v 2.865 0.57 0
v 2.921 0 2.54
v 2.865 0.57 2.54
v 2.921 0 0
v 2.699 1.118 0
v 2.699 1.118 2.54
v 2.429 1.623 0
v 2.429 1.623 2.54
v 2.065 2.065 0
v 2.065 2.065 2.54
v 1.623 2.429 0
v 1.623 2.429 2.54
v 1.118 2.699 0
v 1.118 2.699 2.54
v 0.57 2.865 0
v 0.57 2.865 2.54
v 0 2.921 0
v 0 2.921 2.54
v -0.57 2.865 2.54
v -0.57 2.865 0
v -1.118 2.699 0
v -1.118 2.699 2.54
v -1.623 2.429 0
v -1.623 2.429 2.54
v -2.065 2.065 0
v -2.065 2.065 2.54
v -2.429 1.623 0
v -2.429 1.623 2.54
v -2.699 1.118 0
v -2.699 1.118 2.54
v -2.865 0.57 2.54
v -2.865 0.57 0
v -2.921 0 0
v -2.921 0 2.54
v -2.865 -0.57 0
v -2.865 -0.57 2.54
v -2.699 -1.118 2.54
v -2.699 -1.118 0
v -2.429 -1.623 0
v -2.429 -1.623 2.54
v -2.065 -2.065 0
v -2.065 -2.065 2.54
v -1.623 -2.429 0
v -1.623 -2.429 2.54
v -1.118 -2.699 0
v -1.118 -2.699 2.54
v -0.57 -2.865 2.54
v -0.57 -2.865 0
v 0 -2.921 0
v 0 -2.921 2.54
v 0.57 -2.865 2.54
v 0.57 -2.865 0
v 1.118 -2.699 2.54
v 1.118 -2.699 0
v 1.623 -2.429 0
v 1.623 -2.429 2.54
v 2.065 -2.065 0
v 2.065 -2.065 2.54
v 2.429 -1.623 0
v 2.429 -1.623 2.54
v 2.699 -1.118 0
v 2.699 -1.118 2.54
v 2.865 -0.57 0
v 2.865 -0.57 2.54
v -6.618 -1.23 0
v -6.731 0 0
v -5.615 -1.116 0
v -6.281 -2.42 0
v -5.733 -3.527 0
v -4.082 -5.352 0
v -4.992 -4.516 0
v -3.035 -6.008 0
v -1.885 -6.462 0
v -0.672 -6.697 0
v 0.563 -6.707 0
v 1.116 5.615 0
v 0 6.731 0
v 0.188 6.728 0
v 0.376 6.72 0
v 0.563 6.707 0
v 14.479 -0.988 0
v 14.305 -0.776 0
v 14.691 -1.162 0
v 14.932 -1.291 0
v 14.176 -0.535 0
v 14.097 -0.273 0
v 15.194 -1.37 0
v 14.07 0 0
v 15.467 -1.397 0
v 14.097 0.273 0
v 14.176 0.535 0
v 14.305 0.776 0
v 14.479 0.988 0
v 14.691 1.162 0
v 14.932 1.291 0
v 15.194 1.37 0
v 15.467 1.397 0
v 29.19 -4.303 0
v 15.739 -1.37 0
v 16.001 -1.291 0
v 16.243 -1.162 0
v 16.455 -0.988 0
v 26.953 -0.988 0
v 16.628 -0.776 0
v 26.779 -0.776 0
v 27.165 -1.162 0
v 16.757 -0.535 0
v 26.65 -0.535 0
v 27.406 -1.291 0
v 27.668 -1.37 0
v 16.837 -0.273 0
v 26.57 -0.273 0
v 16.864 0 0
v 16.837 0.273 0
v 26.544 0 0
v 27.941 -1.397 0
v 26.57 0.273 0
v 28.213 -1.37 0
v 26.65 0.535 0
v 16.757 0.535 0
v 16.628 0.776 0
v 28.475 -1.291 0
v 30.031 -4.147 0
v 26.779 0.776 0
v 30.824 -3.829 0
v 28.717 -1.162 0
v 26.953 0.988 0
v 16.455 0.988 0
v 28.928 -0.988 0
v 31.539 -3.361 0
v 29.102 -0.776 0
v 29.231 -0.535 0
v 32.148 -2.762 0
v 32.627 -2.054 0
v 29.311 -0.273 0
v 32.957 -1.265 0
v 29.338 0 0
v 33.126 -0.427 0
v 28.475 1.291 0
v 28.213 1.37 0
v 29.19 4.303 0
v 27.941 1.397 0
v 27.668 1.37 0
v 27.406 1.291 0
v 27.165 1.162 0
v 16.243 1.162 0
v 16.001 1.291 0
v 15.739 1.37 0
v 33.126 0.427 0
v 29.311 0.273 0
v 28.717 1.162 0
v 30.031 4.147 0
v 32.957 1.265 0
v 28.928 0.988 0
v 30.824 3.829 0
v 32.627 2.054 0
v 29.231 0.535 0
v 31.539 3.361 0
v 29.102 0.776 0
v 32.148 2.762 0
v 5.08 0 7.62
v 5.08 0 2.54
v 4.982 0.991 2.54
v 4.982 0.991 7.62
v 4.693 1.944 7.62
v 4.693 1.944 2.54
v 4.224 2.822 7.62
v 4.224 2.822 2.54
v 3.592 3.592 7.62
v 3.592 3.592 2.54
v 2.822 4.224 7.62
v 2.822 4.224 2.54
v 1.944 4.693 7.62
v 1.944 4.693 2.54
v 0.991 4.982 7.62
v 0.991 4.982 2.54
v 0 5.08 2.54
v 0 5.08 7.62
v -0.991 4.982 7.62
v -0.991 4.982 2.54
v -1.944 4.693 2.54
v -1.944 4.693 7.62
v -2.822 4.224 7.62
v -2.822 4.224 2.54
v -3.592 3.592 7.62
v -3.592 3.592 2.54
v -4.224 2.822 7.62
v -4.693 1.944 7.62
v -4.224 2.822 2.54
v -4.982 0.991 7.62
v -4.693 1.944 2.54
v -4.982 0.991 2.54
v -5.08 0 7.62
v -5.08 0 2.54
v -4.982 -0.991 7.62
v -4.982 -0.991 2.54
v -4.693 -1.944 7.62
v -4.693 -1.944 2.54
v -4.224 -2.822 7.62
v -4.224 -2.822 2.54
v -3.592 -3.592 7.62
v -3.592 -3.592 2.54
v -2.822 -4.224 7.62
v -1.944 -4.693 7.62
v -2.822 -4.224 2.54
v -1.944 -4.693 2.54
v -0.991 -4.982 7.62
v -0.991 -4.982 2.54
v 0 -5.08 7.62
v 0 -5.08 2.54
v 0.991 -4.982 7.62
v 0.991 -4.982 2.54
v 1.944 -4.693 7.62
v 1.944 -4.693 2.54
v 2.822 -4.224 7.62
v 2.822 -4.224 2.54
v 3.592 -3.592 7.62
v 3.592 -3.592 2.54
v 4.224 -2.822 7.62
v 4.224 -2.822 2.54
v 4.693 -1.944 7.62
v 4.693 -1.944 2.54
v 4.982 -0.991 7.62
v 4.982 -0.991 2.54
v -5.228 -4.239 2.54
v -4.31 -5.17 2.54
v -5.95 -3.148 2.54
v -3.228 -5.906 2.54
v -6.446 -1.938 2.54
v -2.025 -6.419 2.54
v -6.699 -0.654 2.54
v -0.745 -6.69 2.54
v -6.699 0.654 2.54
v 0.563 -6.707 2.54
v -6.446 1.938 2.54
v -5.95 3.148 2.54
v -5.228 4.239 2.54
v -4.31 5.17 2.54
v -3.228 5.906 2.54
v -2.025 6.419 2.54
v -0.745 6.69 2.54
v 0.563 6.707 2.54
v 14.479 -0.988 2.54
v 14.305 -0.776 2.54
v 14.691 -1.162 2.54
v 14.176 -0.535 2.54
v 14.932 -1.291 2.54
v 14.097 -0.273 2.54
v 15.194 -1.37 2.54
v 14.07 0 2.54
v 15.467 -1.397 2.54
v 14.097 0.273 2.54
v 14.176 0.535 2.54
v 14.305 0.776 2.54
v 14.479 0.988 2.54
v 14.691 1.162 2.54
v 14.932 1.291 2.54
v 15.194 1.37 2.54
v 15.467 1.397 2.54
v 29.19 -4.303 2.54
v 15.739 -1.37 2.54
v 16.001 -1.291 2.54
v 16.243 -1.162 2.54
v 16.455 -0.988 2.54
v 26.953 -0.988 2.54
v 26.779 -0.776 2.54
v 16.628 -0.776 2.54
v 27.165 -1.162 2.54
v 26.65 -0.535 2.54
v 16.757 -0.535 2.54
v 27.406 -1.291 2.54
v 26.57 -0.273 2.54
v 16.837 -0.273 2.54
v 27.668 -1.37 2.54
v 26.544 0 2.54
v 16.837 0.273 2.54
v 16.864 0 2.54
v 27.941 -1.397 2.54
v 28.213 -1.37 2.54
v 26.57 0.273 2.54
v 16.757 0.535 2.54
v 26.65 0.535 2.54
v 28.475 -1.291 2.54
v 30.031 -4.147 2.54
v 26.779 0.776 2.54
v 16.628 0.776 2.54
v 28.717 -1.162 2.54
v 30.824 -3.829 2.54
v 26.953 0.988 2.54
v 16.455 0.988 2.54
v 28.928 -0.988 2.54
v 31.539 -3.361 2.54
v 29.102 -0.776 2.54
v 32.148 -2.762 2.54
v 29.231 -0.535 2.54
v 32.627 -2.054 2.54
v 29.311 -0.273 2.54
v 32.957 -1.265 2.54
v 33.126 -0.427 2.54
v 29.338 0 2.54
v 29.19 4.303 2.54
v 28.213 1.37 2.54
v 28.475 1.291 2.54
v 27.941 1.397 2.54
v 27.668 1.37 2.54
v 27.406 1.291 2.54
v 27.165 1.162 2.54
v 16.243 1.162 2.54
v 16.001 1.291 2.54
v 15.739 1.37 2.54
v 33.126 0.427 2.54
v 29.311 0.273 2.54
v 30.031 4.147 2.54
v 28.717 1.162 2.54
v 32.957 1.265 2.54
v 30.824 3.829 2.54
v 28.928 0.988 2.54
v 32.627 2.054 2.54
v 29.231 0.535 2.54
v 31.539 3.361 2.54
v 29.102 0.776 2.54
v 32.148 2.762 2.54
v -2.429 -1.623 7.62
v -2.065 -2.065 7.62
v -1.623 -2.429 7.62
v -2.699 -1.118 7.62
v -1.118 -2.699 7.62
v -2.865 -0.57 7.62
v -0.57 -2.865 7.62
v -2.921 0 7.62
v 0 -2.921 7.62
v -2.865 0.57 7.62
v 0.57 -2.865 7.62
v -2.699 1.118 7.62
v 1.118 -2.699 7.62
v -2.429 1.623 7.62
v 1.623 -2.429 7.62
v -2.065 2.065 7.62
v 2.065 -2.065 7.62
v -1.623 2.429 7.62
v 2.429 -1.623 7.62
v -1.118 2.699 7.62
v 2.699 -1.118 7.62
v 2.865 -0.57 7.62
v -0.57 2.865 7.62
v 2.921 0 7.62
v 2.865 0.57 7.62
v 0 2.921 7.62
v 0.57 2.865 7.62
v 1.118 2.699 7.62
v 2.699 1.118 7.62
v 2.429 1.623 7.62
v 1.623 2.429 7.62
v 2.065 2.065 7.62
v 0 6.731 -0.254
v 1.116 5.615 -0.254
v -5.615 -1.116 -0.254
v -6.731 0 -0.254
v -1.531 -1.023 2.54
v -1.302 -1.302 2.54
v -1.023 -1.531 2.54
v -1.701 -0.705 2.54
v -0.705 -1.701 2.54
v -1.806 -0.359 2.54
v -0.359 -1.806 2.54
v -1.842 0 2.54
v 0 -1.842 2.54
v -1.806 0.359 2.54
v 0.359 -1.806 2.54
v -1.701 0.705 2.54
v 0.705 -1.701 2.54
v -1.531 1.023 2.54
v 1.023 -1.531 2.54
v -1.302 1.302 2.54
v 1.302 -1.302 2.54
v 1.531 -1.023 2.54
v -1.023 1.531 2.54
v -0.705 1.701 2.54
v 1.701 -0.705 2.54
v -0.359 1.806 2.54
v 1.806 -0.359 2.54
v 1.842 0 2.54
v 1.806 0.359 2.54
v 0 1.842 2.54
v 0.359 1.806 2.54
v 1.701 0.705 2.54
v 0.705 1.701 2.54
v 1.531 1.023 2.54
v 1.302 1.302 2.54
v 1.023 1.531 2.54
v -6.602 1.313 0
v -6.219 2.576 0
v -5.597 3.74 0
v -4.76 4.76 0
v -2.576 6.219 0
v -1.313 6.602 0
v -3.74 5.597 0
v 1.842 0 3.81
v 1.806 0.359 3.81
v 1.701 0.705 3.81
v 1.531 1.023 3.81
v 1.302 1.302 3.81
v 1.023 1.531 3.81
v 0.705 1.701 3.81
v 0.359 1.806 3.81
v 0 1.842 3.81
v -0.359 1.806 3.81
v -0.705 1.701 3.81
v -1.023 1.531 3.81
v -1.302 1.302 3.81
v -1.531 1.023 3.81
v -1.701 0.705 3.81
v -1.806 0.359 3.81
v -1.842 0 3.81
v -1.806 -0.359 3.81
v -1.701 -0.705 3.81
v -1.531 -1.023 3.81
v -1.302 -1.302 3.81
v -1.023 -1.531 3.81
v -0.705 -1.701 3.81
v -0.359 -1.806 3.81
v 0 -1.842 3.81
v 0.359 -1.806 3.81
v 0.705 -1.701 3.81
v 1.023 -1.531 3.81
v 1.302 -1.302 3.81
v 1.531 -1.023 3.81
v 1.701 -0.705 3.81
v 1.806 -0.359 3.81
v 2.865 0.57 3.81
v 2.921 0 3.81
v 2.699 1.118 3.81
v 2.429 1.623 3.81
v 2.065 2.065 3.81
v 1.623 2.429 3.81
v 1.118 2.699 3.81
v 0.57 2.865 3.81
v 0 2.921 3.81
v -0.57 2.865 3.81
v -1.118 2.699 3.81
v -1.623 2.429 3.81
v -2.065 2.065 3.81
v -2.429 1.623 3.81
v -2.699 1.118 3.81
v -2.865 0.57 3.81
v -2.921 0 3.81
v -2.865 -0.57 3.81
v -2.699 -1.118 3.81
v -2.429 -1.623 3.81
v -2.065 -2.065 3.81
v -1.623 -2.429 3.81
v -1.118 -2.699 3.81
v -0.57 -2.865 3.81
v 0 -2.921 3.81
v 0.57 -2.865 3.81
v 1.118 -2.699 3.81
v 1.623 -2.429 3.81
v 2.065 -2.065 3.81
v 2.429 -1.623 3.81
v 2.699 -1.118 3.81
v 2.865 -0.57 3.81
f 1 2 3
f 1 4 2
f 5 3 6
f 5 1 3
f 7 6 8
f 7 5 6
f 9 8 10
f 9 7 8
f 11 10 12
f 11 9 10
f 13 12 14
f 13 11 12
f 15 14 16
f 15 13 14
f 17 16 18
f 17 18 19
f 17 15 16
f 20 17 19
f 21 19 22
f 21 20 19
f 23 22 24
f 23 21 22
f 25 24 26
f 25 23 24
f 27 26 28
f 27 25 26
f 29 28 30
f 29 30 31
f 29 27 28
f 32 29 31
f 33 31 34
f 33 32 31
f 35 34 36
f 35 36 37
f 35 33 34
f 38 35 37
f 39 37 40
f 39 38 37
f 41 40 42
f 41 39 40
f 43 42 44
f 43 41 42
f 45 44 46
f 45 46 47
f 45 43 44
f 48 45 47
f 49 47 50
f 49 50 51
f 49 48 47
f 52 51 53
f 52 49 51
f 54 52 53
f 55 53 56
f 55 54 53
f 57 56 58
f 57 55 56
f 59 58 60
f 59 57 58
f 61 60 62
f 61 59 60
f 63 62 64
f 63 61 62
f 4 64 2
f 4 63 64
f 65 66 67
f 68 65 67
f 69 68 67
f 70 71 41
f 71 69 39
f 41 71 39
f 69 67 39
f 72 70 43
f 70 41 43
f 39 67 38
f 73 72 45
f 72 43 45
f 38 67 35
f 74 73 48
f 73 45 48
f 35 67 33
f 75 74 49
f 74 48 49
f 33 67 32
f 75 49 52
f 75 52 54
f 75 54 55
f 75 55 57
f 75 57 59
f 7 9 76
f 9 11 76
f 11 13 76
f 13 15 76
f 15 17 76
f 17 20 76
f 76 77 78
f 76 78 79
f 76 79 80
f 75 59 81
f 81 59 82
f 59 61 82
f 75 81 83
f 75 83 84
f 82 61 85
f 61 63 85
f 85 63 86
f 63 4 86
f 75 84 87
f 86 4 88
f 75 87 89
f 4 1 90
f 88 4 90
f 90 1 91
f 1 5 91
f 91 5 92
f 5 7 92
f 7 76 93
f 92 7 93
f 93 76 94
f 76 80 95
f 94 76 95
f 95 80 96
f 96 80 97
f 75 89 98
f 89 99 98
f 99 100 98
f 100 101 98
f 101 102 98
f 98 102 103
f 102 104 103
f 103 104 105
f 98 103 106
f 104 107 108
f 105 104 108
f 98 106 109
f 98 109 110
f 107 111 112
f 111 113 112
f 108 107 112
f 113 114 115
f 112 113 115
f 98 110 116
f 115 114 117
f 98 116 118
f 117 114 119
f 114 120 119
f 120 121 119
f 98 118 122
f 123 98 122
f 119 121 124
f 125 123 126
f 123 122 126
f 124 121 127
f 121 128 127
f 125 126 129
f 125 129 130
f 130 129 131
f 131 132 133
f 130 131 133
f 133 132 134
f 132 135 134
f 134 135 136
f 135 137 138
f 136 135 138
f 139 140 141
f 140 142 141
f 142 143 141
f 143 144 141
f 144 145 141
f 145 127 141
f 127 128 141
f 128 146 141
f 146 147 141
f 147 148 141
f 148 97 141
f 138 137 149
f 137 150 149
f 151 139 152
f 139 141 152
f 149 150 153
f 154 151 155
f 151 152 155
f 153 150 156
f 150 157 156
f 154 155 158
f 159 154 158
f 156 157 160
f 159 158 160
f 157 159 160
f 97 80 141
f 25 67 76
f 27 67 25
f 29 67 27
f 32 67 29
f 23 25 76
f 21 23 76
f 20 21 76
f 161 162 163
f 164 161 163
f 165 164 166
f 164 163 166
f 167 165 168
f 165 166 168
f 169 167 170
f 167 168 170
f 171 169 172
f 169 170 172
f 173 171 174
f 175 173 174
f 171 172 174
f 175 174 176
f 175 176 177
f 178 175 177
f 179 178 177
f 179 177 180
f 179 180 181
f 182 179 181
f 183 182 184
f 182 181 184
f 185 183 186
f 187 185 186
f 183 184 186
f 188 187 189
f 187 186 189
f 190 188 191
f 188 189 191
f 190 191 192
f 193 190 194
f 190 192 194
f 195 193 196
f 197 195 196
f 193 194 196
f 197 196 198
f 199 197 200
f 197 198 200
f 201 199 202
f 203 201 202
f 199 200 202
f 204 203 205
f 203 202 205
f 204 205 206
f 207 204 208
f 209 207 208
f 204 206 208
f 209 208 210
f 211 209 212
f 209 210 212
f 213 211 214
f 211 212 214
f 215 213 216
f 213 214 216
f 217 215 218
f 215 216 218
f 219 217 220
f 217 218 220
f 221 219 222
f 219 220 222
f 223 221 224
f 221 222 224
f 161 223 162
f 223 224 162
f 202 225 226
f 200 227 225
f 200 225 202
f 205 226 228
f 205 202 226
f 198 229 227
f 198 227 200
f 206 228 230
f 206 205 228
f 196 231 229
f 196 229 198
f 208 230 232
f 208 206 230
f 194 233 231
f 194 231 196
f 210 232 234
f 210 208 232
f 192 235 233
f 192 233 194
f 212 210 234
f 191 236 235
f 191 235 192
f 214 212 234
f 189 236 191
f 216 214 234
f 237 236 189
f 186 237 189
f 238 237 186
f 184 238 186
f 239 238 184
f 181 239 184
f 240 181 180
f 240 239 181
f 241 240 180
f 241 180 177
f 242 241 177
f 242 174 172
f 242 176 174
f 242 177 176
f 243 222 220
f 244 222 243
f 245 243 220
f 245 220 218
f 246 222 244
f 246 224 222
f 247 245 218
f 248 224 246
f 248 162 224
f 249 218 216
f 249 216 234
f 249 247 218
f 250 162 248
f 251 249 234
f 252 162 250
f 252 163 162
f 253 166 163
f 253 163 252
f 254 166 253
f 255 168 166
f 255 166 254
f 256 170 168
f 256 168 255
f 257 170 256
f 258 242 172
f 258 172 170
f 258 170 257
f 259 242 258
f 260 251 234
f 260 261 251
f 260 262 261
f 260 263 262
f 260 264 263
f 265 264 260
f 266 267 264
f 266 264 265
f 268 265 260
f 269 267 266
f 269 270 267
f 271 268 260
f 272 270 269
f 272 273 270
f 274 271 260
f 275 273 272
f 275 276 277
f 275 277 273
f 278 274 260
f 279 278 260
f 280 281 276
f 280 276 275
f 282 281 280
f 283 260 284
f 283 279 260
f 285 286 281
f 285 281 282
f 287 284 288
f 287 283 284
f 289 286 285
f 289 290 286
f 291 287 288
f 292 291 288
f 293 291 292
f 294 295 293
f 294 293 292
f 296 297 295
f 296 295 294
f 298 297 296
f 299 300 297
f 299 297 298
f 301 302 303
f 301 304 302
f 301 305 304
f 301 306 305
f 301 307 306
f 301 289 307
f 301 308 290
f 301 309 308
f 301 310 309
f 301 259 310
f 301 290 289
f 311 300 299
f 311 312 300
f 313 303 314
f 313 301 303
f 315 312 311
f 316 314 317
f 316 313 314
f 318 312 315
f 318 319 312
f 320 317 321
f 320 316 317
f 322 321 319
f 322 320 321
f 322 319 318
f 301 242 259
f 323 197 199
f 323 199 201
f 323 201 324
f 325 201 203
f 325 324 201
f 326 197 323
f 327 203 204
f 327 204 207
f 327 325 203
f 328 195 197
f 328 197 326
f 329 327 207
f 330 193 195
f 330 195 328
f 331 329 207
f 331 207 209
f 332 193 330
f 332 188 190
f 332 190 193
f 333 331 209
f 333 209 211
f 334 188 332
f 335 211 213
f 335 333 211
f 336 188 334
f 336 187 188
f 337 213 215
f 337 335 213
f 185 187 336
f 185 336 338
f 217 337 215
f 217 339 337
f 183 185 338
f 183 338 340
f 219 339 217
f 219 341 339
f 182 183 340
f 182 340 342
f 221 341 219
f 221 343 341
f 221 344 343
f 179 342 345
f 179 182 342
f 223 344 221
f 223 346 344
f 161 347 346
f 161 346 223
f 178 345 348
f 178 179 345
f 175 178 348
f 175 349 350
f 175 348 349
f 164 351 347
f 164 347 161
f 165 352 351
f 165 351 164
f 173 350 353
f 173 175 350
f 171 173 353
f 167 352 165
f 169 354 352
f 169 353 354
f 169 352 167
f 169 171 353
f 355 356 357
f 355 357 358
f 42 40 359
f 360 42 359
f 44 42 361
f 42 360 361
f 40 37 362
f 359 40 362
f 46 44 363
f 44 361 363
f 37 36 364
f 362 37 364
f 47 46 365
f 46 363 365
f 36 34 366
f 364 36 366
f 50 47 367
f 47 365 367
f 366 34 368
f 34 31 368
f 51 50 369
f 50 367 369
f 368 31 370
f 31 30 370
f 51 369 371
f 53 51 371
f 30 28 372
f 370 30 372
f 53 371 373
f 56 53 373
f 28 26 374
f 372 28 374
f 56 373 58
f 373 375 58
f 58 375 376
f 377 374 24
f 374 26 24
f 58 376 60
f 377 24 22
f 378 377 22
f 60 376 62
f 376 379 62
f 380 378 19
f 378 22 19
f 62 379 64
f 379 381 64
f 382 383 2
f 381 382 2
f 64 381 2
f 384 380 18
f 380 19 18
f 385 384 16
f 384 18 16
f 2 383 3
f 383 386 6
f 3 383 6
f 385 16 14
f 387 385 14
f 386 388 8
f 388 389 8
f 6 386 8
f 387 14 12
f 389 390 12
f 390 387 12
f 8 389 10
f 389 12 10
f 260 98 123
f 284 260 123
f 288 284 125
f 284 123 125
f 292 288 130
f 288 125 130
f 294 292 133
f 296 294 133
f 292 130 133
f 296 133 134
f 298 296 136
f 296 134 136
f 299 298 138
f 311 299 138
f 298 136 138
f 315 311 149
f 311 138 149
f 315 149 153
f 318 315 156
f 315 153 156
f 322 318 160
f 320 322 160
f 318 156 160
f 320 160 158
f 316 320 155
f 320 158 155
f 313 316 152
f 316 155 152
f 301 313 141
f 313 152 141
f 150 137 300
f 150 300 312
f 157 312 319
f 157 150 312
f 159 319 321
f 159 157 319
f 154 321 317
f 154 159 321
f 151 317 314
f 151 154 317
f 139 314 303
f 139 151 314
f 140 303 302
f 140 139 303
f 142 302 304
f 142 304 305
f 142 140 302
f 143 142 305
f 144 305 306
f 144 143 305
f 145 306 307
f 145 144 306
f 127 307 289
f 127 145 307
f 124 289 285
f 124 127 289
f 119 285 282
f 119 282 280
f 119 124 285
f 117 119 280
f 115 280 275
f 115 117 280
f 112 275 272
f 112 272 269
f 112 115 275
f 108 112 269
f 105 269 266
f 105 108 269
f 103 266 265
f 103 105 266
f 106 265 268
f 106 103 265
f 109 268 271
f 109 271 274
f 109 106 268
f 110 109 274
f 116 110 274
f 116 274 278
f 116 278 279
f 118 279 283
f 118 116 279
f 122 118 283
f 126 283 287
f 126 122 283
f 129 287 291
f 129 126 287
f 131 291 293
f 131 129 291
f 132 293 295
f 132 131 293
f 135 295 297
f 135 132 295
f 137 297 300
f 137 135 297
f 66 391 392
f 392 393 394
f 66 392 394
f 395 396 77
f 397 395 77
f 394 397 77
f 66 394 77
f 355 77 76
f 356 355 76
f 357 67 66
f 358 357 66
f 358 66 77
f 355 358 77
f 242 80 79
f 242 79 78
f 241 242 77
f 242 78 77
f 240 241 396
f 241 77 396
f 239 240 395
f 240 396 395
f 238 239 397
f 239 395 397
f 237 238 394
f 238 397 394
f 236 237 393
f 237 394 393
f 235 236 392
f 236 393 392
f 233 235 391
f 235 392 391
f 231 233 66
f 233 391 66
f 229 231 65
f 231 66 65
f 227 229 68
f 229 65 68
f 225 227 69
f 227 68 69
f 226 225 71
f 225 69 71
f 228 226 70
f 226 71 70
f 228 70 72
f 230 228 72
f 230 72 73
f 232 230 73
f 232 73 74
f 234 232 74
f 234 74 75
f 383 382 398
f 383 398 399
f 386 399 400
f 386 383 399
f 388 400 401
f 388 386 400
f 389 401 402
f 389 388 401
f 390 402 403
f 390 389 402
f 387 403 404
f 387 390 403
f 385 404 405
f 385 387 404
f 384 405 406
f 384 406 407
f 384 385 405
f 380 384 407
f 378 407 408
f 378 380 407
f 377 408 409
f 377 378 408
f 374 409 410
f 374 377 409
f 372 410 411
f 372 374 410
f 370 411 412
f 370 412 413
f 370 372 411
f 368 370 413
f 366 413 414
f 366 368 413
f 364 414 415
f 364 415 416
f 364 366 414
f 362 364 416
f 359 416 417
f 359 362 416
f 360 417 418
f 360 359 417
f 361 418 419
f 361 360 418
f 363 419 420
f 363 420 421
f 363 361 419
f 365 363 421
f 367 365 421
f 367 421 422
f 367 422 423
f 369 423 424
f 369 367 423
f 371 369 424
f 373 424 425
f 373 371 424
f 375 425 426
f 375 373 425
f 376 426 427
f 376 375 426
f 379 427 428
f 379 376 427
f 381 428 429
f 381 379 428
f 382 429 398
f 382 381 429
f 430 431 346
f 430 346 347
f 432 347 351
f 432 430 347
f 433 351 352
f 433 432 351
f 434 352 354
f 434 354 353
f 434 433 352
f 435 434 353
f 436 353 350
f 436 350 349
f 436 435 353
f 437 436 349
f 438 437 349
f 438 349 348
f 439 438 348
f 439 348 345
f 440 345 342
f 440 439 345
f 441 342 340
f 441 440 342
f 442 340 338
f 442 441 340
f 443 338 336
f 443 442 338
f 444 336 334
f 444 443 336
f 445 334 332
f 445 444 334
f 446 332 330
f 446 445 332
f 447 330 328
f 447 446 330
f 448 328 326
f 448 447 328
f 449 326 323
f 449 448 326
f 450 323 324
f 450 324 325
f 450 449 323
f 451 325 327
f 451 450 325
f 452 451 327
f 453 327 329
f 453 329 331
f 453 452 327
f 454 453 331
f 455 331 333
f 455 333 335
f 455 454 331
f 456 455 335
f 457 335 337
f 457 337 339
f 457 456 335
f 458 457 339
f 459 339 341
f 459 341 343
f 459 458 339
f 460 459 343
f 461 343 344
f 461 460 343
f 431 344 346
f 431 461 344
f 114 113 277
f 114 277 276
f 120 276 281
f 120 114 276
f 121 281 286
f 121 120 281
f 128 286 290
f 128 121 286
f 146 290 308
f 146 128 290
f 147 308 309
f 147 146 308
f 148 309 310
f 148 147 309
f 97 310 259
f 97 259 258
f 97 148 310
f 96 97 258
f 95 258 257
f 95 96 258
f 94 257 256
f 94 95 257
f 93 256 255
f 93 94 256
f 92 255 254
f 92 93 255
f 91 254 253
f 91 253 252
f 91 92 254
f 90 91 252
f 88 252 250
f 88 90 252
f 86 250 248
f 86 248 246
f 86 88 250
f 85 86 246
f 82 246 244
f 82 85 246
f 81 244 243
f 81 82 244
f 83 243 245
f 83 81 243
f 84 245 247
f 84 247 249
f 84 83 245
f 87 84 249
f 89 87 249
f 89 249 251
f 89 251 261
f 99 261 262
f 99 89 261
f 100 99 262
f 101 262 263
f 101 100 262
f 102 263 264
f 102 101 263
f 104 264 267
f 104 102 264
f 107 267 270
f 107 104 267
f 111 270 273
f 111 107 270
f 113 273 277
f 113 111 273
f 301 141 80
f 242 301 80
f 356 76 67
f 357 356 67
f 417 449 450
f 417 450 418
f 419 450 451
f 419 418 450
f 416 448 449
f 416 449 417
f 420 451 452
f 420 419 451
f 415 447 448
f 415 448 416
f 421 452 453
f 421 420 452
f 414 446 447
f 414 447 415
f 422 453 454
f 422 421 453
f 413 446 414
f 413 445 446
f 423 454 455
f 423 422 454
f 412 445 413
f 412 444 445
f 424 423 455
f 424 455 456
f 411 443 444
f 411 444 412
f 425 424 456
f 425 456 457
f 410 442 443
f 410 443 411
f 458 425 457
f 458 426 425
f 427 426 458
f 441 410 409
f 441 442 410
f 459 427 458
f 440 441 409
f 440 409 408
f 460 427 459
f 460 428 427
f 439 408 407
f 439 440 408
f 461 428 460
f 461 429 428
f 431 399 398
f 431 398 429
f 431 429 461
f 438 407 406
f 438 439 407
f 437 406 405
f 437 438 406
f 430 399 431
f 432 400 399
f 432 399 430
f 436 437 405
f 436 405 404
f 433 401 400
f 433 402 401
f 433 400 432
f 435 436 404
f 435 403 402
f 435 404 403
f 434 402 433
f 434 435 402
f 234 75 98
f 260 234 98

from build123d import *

# Parameters (mm, degrees)
SKETCH1_R           = 2.921
SKETCH1_R_2         = 1.397
BOSS_EXTRUDE1_DEPTH = 2.54
SKETCH2_R           = 5.08
SKETCH2_R_2         = 2.921
BOSS_EXTRUDE2_DEPTH = 5.08
SKETCH3_R           = 2.921
SKETCH3_R_2         = 1.8415
BOSS_EXTRUDE3_DEPTH = 1.27
BOSS_EXTRUDE4_DEPTH = 0.254


with BuildPart() as part:
    # Sketch1 → Boss-Extrude1 (new body)
    with BuildSketch(Plane.XY):
        with BuildLine():
            ThreePointArc((29.190418502, -4.302847972), (33.147, 0), (29.190418502, 4.302847972))
            Line((29.190418502, 4.302847972), (0.563387665, 6.707380662))
            ThreePointArc((0.563387665, 6.707380662), (-6.731, 0), (0.563387665, -6.707380662))
            Line((0.563387665, -6.707380662), (29.190418502, -4.302847972))
        make_face()
        Circle(SKETCH1_R, mode=Mode.SUBTRACT)
        with Locations((15.466782925, 0)):
            Circle(SKETCH1_R_2, mode=Mode.SUBTRACT)
        with Locations((27.940644271, 0)):
            Circle(SKETCH1_R_2, mode=Mode.SUBTRACT)
    extrude(amount=BOSS_EXTRUDE1_DEPTH)

    # Sketch2 → Boss-Extrude2 (add)
    with BuildSketch(Plane.XY.offset(2.54)):
        Circle(SKETCH2_R)
        Circle(SKETCH2_R_2, mode=Mode.SUBTRACT)
    extrude(amount=BOSS_EXTRUDE2_DEPTH)

    # Sketch3 → Boss-Extrude3 (add)
    with BuildSketch(Plane.XY.offset(2.54)):
        Circle(SKETCH3_R)
        Circle(SKETCH3_R_2, mode=Mode.SUBTRACT)
    extrude(amount=BOSS_EXTRUDE3_DEPTH)

    # Sketch4 → Boss-Extrude4 (add)
    with BuildSketch(Plane(origin=(0, 0, 0), x_dir=(-1, 0, 0), z_dir=(0, 0, -1))):
        Polygon((6.731, 0), (0, 6.731), (-1.116069724, 5.614930276), (5.614930276, -1.116069724), align=None)
    extrude(amount=BOSS_EXTRUDE4_DEPTH)


solid = part.part
